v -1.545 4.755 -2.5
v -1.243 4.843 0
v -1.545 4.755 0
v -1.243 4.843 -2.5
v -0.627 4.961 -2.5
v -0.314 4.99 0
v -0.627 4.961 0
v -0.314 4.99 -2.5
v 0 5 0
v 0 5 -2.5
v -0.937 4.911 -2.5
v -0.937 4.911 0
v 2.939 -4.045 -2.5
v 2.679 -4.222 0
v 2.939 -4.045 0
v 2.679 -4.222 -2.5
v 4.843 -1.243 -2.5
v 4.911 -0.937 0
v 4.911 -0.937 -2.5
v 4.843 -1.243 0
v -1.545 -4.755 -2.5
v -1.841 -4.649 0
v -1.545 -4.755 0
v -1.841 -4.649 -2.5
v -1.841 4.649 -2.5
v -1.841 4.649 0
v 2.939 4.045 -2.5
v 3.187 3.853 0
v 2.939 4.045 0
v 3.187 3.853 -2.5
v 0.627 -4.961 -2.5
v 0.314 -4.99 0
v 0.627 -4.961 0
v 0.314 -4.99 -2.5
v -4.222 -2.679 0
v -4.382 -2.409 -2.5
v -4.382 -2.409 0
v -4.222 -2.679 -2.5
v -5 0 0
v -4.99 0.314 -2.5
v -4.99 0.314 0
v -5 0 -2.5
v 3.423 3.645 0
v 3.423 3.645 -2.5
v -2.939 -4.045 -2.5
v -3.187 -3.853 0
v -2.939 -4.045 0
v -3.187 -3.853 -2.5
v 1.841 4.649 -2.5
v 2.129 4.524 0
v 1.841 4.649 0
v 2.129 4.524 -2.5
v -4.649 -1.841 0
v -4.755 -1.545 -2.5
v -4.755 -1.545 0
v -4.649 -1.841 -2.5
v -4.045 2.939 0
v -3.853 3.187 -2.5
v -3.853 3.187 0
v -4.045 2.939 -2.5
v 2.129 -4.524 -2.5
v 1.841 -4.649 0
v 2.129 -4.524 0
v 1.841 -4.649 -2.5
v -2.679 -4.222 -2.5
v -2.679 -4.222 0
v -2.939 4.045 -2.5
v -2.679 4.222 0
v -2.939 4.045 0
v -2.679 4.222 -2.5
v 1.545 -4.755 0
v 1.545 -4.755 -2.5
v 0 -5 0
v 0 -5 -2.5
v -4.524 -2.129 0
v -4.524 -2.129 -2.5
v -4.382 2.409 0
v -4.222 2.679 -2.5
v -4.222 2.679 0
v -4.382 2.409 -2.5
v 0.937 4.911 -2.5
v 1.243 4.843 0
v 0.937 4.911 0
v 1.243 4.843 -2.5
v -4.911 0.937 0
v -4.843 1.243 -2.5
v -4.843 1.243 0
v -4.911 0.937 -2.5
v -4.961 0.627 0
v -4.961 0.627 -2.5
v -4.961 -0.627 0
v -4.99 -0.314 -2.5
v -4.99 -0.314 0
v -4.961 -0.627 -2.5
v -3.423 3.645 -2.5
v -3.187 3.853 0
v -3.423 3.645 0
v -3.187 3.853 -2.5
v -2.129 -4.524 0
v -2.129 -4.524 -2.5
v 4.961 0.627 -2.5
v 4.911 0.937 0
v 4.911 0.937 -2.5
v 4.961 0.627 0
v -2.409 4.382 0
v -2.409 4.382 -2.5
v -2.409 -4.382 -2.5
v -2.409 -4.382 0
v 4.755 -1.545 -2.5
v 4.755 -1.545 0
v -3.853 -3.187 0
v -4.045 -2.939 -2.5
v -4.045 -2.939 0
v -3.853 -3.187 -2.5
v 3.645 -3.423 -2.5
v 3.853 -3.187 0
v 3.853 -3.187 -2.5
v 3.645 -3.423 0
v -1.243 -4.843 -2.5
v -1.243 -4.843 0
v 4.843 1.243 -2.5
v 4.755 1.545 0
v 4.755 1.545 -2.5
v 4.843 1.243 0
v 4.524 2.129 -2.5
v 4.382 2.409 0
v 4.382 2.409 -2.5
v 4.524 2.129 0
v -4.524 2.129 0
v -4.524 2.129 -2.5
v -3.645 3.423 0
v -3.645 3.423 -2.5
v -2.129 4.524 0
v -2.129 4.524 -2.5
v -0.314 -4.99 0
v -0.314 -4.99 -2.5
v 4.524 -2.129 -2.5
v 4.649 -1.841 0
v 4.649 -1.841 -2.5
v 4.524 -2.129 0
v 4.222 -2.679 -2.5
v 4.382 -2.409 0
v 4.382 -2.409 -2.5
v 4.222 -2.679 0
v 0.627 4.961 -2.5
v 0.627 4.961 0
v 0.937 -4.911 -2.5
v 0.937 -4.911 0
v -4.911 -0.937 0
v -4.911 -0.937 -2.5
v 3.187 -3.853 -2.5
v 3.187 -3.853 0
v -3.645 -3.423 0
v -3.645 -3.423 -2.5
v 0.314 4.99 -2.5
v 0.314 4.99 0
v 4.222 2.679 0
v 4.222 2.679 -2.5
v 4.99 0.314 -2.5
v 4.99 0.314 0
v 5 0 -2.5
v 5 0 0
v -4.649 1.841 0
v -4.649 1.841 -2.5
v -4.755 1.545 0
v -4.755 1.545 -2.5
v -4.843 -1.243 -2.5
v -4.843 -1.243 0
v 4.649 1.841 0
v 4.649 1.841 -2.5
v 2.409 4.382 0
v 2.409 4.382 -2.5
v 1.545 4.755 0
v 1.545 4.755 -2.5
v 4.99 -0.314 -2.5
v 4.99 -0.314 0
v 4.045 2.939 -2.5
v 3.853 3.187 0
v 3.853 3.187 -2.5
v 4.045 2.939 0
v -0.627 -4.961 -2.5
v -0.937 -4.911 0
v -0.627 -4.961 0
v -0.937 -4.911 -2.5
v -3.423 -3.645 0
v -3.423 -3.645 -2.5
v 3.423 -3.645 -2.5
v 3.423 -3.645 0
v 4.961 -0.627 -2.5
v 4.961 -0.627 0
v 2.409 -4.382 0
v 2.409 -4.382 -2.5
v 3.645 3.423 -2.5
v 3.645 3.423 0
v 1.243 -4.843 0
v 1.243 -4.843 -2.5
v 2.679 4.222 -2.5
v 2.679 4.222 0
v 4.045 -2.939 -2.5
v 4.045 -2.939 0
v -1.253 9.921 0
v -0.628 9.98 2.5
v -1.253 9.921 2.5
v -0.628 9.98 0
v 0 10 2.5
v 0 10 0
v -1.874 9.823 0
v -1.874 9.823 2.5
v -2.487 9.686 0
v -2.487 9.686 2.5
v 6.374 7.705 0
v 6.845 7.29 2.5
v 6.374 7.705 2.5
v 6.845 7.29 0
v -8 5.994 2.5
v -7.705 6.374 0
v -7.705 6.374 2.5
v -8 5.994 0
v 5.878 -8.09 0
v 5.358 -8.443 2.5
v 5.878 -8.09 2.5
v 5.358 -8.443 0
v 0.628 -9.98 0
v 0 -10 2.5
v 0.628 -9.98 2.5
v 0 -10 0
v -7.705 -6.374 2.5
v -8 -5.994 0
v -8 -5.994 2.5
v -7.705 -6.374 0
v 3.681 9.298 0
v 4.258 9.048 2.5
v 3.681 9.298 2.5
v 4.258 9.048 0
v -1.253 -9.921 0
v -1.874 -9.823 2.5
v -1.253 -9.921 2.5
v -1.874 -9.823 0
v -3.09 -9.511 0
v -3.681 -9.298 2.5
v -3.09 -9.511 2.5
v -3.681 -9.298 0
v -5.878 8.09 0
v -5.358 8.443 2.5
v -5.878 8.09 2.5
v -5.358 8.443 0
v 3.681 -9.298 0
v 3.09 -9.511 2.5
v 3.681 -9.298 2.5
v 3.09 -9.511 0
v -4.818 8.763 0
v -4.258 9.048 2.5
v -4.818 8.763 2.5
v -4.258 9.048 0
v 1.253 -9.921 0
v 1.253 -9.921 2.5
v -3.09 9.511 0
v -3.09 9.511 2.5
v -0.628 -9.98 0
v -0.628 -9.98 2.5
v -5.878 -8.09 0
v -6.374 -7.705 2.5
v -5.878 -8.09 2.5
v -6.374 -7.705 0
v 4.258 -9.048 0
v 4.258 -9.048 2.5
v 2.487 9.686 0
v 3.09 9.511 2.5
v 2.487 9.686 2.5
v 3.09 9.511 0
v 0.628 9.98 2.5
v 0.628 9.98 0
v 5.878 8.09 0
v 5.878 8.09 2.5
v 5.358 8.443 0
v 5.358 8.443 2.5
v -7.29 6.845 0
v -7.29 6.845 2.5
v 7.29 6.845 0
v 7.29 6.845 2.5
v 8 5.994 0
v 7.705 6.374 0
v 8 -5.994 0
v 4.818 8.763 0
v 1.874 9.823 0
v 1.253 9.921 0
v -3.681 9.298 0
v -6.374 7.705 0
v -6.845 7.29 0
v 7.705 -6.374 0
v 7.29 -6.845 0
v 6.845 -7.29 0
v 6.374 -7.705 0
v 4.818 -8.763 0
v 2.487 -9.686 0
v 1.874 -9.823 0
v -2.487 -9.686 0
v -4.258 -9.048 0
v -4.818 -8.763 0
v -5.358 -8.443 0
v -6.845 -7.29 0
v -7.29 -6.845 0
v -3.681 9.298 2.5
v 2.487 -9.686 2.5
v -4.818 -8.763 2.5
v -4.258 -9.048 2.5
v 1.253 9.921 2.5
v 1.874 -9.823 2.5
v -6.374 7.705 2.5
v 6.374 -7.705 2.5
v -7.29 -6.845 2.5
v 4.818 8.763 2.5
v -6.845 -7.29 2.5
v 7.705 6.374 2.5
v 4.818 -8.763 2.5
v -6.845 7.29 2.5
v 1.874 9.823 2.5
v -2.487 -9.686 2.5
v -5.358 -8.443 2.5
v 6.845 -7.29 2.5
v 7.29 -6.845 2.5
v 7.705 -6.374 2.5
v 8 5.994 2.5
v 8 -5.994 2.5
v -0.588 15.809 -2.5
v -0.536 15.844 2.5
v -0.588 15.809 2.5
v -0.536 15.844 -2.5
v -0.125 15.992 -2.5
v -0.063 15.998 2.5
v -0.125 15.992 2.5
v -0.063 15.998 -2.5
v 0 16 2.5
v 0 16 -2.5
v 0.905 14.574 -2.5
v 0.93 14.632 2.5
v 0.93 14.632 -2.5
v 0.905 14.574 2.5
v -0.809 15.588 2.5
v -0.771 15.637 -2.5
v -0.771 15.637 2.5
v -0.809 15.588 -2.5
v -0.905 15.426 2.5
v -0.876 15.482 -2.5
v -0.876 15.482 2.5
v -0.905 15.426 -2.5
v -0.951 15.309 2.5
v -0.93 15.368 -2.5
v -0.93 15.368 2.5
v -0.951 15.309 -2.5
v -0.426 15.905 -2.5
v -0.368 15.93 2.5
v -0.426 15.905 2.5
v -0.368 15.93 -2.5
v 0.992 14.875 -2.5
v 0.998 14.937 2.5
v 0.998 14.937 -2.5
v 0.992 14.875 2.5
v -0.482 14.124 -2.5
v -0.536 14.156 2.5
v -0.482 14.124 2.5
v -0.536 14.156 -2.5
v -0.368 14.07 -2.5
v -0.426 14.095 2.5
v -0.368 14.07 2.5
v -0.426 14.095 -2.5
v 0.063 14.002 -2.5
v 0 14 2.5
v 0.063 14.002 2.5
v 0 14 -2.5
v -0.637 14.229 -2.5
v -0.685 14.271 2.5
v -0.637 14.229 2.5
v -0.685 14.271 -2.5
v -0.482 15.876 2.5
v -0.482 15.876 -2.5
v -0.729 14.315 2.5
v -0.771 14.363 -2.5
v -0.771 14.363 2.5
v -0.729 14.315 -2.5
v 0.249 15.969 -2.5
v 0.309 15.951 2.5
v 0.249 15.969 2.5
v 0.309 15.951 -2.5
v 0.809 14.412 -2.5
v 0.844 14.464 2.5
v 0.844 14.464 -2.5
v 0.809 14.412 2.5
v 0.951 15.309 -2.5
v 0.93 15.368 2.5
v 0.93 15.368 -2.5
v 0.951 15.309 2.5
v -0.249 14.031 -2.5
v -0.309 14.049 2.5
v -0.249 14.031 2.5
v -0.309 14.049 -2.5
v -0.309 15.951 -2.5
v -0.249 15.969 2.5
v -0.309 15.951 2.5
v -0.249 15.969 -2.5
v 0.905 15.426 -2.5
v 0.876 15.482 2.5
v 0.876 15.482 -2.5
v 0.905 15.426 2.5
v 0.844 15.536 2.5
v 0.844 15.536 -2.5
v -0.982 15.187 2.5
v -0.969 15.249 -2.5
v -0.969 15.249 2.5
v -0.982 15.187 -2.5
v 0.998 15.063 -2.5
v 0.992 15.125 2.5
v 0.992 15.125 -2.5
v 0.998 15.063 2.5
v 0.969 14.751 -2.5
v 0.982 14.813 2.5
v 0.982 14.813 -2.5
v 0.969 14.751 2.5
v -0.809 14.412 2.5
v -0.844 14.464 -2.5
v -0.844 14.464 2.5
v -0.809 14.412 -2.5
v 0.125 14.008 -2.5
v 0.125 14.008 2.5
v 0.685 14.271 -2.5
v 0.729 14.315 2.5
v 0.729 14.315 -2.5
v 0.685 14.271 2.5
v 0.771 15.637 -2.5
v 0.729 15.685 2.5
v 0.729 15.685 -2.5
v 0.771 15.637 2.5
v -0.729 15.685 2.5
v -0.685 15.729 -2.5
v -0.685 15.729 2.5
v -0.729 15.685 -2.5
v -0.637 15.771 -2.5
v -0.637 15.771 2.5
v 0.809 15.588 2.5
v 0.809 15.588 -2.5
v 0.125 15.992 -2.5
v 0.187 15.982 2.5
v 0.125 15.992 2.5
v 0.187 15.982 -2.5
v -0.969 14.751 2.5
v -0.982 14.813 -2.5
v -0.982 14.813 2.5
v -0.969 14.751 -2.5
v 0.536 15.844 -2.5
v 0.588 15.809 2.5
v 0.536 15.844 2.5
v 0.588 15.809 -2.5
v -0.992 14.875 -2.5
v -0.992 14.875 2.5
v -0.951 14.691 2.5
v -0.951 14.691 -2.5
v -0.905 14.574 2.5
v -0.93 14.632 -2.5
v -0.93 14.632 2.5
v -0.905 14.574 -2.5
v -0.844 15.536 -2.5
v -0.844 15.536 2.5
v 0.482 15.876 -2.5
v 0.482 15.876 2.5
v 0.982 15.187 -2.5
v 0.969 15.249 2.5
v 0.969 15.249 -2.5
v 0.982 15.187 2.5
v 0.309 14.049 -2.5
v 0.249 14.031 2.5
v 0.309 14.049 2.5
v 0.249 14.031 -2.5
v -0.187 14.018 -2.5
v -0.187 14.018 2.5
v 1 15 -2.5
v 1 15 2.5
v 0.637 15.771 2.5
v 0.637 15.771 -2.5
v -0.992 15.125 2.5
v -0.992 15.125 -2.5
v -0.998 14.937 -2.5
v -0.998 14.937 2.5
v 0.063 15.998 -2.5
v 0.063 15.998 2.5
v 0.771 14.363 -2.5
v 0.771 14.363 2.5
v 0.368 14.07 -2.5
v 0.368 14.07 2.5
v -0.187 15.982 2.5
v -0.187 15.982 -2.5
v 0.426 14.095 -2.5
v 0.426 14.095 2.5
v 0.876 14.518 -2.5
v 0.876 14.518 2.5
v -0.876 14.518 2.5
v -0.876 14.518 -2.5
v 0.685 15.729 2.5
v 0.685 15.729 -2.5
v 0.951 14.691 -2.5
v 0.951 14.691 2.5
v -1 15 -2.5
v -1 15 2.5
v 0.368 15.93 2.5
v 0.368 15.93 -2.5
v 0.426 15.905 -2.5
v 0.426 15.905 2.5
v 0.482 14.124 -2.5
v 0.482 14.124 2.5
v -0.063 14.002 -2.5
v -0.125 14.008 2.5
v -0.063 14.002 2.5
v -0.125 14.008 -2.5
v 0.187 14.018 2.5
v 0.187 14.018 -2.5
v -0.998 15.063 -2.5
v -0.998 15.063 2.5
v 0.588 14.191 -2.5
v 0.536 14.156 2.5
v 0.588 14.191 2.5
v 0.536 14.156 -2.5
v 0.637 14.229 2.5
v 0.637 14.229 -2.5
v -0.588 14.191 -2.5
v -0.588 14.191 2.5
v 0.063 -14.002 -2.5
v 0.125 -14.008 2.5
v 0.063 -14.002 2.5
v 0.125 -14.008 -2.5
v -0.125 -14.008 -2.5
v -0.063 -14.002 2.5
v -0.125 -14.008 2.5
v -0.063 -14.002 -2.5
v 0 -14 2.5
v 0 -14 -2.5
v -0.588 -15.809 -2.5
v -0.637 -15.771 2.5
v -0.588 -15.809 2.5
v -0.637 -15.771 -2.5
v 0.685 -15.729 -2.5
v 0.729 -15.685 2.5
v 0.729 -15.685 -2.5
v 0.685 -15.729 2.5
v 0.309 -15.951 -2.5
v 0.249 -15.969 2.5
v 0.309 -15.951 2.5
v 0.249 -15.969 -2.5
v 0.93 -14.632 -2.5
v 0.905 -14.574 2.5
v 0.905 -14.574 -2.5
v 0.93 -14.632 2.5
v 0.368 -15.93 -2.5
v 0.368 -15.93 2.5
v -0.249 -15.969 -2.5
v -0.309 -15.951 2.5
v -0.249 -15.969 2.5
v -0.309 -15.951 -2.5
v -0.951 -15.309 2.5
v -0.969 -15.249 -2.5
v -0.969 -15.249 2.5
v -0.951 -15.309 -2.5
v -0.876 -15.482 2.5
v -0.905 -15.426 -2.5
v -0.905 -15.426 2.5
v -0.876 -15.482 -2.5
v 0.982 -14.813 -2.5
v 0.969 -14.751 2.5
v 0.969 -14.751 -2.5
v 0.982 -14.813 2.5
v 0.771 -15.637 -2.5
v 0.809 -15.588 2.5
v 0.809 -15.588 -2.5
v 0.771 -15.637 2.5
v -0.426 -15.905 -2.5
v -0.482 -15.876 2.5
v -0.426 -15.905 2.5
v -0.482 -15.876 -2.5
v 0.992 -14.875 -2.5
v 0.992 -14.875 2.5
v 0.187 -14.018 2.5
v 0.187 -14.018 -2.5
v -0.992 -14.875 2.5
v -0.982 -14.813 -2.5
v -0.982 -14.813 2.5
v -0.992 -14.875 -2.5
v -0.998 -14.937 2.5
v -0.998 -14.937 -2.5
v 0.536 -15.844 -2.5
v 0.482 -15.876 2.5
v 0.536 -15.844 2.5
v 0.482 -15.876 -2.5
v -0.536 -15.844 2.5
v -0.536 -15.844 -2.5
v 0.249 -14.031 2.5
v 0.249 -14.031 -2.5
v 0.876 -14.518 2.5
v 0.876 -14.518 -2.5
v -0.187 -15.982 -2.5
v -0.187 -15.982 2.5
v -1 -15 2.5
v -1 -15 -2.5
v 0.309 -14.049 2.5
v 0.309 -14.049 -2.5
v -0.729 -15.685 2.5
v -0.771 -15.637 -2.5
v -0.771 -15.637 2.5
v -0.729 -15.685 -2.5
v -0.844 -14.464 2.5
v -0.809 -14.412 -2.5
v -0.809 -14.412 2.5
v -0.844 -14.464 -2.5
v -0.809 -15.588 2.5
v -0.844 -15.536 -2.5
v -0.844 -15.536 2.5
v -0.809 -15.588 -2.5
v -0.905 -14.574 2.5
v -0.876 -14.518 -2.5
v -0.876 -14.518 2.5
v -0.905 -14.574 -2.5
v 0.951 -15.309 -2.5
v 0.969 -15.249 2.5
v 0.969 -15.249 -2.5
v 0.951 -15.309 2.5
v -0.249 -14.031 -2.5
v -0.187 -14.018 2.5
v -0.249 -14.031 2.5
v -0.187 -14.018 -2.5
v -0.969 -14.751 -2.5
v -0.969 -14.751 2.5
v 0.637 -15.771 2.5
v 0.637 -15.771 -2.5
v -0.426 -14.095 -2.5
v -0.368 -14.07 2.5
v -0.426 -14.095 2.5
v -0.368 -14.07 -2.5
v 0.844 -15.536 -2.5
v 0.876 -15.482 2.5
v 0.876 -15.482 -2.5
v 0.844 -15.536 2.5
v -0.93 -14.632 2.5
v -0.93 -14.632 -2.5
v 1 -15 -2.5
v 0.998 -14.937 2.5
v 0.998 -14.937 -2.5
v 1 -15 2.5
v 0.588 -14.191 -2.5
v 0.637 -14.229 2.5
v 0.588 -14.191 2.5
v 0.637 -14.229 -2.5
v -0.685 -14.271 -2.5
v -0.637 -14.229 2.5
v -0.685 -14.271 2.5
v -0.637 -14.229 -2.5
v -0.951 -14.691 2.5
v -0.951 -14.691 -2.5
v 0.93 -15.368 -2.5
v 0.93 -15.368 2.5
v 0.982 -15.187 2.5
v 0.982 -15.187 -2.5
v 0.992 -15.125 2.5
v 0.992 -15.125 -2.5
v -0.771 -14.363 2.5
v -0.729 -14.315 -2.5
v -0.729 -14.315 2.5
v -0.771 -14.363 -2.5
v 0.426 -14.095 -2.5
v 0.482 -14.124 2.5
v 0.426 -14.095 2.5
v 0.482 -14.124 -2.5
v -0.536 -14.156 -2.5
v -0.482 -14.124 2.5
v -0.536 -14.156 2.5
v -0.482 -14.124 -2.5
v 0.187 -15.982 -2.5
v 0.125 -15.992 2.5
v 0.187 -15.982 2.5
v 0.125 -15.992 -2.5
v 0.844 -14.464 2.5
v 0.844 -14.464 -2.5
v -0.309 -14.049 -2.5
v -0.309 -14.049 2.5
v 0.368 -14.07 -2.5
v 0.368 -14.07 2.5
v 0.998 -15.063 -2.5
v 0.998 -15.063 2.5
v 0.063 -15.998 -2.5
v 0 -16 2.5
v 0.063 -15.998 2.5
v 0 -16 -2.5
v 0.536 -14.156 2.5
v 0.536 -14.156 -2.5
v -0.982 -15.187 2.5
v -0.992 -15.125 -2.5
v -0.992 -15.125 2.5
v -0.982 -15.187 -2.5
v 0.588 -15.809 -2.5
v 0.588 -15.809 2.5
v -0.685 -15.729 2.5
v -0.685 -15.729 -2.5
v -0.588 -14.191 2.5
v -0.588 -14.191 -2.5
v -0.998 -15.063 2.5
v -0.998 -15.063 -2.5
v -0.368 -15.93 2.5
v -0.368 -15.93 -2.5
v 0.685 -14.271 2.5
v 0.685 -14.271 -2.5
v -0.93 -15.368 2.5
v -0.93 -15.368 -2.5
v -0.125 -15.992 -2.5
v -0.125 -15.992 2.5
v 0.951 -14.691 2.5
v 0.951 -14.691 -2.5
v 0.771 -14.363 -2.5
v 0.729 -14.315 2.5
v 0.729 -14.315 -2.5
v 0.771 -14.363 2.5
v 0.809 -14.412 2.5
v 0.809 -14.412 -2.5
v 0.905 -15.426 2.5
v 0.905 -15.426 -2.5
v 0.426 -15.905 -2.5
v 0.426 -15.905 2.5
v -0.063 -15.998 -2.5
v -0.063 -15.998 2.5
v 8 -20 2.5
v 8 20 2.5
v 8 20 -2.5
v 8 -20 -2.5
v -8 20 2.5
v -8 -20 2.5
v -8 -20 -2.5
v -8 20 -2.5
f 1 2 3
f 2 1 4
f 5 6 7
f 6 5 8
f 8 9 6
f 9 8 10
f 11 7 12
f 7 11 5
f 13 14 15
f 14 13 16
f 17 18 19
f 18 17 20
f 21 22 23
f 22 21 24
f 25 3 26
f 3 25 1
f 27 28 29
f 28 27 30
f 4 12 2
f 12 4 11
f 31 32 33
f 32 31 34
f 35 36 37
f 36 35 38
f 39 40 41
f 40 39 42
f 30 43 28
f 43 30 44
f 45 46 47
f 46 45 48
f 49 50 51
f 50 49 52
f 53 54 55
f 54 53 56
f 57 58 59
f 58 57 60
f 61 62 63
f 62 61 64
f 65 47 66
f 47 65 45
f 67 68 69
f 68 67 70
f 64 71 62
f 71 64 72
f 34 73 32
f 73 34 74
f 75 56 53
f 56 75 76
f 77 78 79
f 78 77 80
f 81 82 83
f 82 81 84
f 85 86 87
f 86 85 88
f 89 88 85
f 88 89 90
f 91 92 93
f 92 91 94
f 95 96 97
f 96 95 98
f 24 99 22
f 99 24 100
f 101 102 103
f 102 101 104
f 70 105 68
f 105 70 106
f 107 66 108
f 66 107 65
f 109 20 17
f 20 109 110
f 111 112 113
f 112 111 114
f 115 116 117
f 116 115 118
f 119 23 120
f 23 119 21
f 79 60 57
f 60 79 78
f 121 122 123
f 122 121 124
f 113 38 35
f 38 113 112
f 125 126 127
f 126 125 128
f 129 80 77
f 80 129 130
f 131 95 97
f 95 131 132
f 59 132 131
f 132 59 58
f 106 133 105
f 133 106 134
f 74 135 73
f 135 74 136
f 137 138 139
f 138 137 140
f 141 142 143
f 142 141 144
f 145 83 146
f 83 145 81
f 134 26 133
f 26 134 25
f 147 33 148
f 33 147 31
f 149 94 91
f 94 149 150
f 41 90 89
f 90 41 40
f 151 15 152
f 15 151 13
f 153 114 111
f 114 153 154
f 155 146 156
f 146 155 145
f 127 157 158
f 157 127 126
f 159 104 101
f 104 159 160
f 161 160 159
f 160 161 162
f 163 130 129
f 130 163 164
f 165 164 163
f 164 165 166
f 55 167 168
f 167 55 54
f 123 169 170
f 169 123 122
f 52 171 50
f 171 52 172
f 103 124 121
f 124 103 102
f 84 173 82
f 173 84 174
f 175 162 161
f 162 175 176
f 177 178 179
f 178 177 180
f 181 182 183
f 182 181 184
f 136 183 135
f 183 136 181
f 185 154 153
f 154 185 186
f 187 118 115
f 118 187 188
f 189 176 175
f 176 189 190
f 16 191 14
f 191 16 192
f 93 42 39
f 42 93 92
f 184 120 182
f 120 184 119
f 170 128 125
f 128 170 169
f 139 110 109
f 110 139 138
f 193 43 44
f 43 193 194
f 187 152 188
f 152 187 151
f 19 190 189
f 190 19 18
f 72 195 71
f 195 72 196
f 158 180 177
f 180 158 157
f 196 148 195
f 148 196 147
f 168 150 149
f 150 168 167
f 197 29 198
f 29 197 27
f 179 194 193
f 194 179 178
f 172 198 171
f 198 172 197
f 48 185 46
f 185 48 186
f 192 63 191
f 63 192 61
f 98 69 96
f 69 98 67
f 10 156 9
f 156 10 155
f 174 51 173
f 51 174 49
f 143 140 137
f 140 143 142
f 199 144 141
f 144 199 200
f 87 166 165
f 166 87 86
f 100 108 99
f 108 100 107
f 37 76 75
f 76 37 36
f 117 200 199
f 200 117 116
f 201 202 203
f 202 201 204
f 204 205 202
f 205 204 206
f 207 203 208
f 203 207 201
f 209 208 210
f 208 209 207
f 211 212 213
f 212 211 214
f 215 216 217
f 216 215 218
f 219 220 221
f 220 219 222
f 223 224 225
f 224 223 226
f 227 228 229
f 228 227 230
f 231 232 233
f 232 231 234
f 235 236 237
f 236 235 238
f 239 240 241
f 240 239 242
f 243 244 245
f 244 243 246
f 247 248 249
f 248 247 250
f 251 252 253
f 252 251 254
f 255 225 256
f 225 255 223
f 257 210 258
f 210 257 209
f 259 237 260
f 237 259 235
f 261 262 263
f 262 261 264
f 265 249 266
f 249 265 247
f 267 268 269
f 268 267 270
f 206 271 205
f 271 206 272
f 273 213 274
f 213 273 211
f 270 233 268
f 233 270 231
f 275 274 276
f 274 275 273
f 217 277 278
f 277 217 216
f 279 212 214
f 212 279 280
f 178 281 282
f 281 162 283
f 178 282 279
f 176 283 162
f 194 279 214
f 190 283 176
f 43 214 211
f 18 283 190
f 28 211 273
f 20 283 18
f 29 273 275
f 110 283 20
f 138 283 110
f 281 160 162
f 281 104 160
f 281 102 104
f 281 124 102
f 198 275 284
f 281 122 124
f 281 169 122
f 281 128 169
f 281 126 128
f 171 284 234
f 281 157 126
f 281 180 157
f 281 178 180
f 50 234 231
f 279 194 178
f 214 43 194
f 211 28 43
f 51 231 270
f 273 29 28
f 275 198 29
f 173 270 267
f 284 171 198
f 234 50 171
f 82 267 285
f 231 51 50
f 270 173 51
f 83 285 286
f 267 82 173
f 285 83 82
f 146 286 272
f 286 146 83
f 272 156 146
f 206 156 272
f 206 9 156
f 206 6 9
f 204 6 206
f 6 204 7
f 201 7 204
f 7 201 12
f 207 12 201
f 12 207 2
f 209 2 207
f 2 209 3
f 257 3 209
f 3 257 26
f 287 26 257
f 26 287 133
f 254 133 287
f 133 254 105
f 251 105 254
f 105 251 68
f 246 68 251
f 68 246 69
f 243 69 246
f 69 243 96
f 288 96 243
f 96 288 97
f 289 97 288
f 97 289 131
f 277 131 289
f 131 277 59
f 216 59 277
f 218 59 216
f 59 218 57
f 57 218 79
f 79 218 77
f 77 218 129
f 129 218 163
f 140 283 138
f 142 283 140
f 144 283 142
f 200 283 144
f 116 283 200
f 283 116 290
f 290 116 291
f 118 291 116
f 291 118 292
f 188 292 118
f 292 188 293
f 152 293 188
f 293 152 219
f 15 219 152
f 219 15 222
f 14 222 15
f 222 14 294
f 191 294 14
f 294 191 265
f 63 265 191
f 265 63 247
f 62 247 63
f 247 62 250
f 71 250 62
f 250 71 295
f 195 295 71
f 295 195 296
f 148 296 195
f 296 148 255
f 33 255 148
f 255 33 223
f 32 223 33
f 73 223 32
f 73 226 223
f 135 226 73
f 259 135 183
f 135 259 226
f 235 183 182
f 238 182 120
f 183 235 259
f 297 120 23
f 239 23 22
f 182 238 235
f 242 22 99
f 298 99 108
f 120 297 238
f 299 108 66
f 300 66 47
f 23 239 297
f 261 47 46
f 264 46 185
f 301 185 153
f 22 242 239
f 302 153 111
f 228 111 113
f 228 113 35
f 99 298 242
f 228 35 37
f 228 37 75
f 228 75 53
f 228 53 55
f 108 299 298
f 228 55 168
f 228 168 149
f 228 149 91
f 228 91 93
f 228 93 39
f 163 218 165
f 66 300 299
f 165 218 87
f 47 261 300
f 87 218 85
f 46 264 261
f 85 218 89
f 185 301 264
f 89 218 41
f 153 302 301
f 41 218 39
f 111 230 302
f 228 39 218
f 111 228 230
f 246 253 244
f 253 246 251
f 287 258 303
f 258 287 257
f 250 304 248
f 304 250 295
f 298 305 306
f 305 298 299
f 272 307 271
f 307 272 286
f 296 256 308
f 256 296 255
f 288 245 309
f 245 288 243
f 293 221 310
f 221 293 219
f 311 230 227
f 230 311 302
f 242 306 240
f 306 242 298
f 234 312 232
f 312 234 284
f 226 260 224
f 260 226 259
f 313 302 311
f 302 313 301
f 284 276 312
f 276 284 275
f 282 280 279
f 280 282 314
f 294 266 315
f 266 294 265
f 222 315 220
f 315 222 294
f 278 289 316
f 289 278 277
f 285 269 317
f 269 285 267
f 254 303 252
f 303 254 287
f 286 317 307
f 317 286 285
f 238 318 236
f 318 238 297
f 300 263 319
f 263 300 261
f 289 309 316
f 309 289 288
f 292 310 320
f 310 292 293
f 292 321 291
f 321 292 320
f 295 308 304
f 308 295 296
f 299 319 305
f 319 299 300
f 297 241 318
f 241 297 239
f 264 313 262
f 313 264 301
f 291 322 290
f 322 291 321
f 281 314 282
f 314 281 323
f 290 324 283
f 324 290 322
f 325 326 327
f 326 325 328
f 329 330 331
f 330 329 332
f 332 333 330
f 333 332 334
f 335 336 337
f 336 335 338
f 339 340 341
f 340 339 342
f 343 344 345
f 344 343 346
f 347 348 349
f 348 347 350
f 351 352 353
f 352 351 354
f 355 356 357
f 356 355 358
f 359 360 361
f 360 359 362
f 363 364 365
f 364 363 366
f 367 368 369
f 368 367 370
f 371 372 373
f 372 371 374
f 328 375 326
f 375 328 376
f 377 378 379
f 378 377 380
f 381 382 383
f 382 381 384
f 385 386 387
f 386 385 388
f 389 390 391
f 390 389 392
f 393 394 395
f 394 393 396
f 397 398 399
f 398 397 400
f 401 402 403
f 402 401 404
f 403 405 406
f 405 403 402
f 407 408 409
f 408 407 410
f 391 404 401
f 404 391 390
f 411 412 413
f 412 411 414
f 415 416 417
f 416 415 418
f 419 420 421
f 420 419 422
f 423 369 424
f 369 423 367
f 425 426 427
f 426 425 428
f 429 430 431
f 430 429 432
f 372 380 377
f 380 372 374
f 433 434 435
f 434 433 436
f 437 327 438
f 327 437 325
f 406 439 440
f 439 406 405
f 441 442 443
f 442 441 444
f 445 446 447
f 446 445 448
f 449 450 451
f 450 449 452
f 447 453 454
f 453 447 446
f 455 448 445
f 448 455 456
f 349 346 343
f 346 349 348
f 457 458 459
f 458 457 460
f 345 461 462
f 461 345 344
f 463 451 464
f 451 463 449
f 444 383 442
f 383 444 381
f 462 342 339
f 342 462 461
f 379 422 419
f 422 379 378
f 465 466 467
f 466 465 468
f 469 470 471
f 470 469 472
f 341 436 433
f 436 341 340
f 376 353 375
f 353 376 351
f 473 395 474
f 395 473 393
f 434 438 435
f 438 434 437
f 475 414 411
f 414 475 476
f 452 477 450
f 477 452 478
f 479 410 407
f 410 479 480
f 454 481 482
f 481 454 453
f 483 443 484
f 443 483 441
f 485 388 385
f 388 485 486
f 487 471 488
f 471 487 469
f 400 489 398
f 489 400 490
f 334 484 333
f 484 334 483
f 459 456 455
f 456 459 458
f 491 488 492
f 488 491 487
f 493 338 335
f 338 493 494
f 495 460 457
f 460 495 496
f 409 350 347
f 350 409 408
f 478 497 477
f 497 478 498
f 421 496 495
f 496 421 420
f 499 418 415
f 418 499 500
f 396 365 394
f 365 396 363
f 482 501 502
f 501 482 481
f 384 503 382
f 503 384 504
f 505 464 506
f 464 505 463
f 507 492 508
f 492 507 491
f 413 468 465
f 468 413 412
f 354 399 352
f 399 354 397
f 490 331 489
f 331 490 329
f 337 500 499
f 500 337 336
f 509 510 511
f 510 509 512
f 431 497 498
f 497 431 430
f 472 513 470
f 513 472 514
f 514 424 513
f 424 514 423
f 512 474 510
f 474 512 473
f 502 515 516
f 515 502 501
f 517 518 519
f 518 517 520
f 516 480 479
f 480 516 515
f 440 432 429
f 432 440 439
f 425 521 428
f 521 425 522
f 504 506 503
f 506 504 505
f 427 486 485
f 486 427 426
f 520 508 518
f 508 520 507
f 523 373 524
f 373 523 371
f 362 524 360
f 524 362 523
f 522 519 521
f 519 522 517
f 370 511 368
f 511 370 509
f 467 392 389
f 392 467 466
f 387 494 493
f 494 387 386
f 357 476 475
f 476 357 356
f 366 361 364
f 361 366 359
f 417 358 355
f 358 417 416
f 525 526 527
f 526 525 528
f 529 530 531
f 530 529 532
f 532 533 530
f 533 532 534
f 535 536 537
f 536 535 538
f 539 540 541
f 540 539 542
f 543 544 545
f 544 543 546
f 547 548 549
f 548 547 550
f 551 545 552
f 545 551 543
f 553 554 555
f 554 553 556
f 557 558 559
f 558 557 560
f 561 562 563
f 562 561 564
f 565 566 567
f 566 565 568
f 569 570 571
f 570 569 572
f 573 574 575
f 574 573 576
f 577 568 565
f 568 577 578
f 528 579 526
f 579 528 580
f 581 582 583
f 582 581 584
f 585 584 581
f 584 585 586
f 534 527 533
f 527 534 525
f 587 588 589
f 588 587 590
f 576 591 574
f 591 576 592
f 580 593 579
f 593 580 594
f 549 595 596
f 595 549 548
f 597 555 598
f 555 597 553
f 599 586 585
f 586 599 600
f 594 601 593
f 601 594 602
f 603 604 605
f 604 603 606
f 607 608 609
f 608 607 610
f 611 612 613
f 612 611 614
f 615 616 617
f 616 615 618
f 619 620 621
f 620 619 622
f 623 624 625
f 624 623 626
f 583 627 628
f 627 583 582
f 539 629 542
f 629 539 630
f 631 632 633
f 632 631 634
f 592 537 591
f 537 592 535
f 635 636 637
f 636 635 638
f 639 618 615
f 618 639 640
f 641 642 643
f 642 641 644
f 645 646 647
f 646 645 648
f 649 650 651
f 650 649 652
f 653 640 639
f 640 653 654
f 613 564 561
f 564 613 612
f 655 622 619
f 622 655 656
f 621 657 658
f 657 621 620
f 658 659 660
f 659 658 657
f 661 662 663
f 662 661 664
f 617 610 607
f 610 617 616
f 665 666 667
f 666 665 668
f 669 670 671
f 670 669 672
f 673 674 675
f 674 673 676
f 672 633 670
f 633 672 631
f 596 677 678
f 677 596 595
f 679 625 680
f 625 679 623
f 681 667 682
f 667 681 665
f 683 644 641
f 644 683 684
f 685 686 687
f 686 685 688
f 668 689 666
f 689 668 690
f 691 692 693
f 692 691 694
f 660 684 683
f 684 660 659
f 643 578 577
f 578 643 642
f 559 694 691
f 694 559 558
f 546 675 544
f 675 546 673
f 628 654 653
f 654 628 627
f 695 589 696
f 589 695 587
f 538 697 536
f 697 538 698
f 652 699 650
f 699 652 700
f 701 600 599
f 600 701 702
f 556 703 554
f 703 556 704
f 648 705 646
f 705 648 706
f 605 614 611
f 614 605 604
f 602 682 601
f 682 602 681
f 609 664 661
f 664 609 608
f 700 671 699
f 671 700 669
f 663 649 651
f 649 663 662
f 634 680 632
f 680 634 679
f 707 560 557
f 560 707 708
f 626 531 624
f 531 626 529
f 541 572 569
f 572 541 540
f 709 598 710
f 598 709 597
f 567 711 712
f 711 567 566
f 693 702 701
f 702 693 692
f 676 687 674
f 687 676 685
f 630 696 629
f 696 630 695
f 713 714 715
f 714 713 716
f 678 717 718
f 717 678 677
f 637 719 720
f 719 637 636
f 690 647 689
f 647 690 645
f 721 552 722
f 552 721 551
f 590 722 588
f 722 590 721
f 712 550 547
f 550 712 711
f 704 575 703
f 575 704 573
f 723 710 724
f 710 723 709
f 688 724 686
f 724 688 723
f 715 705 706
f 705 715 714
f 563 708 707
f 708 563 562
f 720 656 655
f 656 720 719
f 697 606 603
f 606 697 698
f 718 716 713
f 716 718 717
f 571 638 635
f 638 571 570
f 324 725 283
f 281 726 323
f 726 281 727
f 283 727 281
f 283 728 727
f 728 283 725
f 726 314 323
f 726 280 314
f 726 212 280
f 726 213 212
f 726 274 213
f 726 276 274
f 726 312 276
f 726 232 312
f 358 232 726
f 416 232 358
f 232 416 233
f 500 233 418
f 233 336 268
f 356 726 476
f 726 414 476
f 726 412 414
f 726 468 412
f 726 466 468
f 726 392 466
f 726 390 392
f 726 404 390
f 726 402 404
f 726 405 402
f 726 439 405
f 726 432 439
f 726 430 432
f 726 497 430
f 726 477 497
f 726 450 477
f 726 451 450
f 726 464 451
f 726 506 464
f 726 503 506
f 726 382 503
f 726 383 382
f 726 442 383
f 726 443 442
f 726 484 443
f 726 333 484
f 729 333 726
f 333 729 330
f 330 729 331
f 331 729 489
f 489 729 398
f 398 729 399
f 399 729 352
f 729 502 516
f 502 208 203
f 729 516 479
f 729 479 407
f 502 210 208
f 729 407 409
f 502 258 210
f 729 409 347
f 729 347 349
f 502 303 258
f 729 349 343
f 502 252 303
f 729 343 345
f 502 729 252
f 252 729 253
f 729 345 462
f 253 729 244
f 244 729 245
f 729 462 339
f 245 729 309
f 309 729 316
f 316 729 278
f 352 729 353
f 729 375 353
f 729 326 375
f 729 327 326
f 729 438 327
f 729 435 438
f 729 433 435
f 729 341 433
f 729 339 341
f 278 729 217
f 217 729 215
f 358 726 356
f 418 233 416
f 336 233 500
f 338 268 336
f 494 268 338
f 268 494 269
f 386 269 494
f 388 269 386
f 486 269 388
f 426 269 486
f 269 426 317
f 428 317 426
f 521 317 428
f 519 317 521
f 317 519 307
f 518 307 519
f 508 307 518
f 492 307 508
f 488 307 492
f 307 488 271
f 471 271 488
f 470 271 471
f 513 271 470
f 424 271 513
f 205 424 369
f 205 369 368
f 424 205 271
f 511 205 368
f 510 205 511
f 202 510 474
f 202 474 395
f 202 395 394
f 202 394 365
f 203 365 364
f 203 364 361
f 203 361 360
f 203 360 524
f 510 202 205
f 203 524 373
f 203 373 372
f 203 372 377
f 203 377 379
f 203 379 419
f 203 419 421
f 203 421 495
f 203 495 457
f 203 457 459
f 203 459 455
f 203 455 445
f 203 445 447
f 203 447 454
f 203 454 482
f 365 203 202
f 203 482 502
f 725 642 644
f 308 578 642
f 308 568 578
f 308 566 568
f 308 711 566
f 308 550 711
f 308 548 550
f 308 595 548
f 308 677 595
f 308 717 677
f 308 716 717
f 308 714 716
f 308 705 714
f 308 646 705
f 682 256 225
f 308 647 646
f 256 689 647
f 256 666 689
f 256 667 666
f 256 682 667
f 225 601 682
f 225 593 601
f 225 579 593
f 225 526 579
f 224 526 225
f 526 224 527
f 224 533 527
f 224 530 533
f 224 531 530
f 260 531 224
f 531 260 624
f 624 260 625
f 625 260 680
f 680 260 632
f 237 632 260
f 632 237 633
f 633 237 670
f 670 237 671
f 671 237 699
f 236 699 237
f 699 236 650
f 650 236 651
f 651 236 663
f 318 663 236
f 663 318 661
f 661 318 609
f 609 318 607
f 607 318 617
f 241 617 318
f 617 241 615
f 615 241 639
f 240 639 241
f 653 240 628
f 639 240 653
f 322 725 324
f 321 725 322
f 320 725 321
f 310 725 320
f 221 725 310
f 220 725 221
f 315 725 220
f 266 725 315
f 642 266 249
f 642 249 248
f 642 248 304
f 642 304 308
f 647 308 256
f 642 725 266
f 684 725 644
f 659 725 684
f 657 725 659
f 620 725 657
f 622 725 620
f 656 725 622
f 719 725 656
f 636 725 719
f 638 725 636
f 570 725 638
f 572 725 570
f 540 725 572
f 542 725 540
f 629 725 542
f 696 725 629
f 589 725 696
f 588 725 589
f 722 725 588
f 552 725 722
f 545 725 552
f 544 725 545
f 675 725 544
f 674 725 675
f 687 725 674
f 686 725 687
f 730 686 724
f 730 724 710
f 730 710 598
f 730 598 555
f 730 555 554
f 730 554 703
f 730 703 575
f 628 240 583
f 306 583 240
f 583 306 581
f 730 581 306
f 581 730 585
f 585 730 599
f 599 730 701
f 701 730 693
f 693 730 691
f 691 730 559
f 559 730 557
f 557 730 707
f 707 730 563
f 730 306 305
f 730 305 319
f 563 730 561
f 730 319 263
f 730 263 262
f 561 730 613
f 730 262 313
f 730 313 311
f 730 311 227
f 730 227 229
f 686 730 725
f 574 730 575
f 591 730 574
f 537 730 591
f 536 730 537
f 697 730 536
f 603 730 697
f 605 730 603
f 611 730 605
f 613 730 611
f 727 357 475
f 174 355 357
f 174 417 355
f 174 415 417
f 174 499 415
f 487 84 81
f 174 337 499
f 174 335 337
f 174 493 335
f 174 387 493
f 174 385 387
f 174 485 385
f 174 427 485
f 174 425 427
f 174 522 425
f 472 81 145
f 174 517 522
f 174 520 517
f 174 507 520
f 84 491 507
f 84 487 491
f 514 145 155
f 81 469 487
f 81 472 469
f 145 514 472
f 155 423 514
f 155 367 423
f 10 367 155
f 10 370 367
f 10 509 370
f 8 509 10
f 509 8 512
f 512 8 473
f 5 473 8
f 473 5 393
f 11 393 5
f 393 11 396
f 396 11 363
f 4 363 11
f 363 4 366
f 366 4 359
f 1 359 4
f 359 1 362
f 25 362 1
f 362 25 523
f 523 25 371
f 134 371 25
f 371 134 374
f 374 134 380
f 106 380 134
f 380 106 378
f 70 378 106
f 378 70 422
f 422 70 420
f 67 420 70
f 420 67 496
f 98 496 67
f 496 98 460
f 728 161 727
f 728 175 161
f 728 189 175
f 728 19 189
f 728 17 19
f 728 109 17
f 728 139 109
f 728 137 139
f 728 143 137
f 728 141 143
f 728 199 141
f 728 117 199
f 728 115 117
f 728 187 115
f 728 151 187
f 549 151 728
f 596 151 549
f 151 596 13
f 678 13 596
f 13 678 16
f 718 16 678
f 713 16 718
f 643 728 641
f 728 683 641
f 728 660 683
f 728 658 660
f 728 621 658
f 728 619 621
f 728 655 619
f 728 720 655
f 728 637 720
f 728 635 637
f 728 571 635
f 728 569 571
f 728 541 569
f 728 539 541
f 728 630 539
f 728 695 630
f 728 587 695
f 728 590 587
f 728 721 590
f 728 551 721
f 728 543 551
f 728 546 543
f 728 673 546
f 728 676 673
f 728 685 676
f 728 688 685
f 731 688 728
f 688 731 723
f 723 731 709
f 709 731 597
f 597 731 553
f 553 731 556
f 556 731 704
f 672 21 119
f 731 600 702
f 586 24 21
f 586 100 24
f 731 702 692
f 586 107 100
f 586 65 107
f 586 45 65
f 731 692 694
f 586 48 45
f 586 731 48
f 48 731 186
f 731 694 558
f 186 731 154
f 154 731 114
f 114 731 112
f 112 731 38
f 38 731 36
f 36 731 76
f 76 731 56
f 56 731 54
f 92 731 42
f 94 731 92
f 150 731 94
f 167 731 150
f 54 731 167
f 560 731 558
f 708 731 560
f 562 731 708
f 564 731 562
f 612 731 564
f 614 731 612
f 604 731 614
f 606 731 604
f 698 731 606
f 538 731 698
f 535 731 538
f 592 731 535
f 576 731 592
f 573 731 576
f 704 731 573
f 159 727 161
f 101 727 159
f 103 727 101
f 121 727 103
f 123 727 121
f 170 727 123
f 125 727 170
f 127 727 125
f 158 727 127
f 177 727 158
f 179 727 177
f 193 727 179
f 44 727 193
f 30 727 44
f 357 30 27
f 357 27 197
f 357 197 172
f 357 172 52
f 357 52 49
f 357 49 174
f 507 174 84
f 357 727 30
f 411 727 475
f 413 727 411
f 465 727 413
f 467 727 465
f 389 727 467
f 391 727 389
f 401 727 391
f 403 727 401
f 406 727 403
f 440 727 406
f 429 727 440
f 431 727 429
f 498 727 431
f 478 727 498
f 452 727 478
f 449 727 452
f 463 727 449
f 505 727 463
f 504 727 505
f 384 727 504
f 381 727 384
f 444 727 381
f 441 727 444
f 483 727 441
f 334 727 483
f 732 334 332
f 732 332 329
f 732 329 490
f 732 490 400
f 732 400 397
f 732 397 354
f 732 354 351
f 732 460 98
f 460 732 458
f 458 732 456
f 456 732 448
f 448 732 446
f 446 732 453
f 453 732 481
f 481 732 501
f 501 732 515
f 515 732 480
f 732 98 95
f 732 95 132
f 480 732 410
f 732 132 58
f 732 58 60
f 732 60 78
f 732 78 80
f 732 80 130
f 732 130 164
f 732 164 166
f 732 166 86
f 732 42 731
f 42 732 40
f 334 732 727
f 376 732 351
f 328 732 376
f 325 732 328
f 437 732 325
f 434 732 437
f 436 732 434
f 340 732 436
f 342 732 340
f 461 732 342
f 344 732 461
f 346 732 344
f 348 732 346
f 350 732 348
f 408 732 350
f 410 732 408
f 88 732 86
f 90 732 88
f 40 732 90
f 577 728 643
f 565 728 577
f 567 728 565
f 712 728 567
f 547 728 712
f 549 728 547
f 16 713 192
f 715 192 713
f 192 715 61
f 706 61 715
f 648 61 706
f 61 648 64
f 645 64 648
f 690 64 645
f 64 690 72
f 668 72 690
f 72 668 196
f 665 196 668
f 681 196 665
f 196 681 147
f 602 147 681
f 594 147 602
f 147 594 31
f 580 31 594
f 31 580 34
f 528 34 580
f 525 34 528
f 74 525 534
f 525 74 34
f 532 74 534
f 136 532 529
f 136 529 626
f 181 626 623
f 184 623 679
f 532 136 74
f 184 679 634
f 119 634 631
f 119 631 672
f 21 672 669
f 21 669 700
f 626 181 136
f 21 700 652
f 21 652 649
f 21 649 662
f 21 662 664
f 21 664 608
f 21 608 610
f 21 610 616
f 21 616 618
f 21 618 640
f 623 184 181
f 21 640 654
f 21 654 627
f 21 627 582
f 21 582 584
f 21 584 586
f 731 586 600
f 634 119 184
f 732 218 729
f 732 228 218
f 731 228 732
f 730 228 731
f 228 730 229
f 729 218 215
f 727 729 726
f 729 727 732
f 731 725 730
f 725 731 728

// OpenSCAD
difference(){
	union(){
        
       translate([0,0,0]){
           cube([16,40,5], center=true);
       }
	}
	union() {
        
       translate([0,0,0]){
            rotate(a = [0,0,90]) {
              cylinder(h=600, r=5, $fn=100, center=true);
            }
       }			   
       translate([0,0,0]){
            rotate(a = [0,0,90]) {
              cylinder(h=600, r=10, $fn=100, center=false);
            }
       }			   
       translate([0,15,0]){
            rotate(a = [0,0,90]) {
              cylinder(h=600, r=1, $fn=100, center=true);
            }
       }			   
       translate([0,-15,0]){
            rotate(a = [0,0,90]) {
              cylinder(h=600, r=1, $fn=100, center=true);
            }
       }			   
		   

        
	}
}
